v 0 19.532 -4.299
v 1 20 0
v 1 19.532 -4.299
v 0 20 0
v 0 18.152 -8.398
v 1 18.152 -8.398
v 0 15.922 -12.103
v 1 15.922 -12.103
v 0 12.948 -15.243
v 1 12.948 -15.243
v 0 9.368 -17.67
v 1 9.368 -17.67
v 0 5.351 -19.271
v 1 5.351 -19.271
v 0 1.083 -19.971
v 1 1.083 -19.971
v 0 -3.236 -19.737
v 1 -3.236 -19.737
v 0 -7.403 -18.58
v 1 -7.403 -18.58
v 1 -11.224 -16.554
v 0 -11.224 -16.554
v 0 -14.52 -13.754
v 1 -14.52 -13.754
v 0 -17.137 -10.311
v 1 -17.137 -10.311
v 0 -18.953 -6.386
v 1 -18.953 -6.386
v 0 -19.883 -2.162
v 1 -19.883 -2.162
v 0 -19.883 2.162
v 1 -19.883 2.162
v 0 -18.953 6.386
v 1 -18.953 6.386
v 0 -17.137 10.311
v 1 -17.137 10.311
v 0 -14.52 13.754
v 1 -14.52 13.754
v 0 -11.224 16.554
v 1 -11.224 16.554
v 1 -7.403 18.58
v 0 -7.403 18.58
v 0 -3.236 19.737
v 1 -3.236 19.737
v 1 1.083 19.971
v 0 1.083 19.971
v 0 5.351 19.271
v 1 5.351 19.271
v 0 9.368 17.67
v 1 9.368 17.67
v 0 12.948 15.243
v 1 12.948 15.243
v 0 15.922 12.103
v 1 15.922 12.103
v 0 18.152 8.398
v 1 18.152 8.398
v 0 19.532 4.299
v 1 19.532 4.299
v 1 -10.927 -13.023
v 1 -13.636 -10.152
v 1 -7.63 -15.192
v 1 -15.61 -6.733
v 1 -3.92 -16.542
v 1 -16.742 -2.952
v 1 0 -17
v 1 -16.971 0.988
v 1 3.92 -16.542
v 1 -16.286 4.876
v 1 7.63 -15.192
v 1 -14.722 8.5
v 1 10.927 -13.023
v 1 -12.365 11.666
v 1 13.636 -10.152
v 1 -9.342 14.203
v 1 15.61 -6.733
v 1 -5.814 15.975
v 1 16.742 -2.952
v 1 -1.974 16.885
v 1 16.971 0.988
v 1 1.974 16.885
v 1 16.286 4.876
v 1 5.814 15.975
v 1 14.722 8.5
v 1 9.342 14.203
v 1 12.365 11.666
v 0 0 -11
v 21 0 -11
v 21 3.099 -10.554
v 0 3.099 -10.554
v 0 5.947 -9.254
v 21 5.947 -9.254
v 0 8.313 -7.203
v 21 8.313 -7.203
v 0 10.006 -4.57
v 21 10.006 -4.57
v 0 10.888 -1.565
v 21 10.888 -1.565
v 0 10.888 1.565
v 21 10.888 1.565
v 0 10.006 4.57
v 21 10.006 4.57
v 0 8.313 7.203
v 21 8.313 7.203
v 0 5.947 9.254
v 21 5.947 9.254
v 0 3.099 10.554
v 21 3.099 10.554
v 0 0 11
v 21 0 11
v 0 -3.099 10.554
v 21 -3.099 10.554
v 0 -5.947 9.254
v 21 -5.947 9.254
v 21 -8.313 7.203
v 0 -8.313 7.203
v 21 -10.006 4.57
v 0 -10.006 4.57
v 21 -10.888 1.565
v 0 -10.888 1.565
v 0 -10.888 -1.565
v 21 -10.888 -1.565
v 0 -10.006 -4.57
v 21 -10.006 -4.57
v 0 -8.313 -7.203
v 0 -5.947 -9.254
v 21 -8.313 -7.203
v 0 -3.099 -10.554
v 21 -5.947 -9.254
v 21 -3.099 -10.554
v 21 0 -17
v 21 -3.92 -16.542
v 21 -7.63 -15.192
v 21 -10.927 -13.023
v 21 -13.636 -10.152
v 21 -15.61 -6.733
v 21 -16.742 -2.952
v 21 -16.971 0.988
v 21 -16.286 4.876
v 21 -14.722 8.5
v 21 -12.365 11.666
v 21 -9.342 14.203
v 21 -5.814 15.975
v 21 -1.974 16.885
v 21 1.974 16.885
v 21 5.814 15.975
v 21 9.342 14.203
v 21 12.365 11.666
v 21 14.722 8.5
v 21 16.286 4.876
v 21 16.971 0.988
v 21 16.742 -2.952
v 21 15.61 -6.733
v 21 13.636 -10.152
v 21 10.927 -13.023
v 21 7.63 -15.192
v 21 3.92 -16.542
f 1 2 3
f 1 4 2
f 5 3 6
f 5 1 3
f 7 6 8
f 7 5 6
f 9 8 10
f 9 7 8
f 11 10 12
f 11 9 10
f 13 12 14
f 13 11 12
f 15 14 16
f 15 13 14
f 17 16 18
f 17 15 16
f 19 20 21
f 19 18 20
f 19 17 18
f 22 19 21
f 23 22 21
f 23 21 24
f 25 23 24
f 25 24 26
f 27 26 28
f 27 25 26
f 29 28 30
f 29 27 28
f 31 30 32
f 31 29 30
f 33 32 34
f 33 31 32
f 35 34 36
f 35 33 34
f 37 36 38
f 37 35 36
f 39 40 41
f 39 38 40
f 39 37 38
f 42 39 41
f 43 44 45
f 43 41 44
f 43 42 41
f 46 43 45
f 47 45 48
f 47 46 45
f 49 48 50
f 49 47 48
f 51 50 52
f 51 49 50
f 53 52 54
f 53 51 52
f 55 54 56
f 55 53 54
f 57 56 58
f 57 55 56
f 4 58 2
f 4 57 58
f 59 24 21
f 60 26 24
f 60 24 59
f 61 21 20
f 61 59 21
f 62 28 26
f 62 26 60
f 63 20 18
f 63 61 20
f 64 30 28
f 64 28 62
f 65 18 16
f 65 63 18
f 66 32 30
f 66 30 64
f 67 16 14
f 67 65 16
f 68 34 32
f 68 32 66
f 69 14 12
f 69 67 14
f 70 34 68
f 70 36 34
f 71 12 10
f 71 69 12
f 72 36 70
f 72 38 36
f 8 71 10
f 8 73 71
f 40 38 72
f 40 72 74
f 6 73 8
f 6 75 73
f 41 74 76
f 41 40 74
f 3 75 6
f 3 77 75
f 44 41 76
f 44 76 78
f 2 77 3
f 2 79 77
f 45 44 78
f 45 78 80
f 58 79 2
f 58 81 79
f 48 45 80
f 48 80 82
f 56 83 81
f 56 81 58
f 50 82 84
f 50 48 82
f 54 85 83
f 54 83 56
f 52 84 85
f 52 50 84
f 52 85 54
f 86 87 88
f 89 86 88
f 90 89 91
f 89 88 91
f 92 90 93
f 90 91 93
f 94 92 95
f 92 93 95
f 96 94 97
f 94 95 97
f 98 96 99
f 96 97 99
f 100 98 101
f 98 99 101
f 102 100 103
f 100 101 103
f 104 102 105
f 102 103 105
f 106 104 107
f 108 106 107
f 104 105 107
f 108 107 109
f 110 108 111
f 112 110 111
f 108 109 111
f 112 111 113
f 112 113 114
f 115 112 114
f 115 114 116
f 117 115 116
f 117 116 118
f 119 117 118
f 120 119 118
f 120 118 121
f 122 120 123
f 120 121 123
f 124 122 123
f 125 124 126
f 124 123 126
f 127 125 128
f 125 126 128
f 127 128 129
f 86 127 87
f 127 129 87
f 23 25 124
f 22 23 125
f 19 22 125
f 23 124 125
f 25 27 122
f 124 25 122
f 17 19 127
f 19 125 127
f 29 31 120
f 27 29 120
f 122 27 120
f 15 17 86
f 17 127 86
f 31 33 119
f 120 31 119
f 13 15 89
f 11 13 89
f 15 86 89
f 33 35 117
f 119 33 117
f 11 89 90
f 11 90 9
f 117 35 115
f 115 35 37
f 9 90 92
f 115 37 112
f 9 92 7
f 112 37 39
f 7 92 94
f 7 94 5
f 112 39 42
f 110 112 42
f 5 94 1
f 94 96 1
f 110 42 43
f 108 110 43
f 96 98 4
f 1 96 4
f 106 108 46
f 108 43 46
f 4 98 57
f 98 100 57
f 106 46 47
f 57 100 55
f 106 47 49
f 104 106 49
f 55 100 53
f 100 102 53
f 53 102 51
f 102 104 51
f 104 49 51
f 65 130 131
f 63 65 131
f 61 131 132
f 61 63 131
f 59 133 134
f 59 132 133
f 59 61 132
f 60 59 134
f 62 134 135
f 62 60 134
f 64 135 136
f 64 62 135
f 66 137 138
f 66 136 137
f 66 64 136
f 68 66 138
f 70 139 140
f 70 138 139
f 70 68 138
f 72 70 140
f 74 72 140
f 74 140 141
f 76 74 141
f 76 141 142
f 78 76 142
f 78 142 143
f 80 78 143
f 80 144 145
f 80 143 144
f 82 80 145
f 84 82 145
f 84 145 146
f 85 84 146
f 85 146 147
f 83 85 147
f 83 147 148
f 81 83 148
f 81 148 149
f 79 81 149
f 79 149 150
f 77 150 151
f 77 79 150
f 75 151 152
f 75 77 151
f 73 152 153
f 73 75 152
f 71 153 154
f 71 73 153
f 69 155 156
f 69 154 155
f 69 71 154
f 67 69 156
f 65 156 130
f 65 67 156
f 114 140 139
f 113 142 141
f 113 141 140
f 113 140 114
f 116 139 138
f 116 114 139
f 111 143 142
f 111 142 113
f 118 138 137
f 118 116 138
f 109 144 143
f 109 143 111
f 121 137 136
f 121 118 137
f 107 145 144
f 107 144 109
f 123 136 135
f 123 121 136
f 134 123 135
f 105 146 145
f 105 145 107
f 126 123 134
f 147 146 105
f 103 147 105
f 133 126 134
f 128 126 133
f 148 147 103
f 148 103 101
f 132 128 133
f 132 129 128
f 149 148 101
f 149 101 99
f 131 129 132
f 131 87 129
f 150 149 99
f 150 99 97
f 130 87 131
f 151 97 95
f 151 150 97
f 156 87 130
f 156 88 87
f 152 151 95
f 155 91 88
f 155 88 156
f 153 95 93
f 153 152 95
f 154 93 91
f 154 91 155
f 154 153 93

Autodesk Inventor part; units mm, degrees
ref_plane "YZ Plane" through (0, 0, 0) normal (1, 0, 0) x (0, 1, 0)
ref_plane "XZ Plane" through (0, 0, 0) normal (0, 1, 0) x (-1, 0, 0)
ref_plane "XY Plane" through (0, 0, 0) normal (0, 0, 1) x (1, 0, 0)
sketch "Skizze1" plane through (0, 0, 0) normal (1, 0, 0) x (0, 1, 0)
  circle A0 centre (0, 0) radius 20
  dimension "d0" = 40
extrude "Extrusion1" add sketch "Skizze1" along normal blind 1
sketch "Skizze2" plane through (1, 0, 0) normal (1, 0, 0) x (0, 0, -1)
  circle A0 centre (0, 0) radius 20 projected
  circle A1 centre (0, 0) radius 17
  dimension "d3" = 34
extrude "Extrusion2" add sketch "Skizze2" along normal blind 20 contours A1
sketch "Skizze5" plane through (0, 0, 0) normal (-1, 0, 0) x (0, 0, 1)
  circle A0 centre (0, 0) radius 20 projected
  circle A1 centre (0, 0) radius 5
  dimension "d12" = 10
extrude "Extrusion5" add sketch "Skizze5" along normal blind 10 contours A1
sketch "Skizze6" plane through (21, 0, 0) normal (1, 0, 0) x (0, 0, -1)
  circle A0 centre (0, 0) radius 17 projected
  circle A1 centre (0, 0) radius 11
  dimension "d15" = 22
extrude "Extrusion6" cut sketch "Skizze6" against normal through all contours A1
properties part number "Rolle_schieber" material "PC/ABS-Kunststoff"
